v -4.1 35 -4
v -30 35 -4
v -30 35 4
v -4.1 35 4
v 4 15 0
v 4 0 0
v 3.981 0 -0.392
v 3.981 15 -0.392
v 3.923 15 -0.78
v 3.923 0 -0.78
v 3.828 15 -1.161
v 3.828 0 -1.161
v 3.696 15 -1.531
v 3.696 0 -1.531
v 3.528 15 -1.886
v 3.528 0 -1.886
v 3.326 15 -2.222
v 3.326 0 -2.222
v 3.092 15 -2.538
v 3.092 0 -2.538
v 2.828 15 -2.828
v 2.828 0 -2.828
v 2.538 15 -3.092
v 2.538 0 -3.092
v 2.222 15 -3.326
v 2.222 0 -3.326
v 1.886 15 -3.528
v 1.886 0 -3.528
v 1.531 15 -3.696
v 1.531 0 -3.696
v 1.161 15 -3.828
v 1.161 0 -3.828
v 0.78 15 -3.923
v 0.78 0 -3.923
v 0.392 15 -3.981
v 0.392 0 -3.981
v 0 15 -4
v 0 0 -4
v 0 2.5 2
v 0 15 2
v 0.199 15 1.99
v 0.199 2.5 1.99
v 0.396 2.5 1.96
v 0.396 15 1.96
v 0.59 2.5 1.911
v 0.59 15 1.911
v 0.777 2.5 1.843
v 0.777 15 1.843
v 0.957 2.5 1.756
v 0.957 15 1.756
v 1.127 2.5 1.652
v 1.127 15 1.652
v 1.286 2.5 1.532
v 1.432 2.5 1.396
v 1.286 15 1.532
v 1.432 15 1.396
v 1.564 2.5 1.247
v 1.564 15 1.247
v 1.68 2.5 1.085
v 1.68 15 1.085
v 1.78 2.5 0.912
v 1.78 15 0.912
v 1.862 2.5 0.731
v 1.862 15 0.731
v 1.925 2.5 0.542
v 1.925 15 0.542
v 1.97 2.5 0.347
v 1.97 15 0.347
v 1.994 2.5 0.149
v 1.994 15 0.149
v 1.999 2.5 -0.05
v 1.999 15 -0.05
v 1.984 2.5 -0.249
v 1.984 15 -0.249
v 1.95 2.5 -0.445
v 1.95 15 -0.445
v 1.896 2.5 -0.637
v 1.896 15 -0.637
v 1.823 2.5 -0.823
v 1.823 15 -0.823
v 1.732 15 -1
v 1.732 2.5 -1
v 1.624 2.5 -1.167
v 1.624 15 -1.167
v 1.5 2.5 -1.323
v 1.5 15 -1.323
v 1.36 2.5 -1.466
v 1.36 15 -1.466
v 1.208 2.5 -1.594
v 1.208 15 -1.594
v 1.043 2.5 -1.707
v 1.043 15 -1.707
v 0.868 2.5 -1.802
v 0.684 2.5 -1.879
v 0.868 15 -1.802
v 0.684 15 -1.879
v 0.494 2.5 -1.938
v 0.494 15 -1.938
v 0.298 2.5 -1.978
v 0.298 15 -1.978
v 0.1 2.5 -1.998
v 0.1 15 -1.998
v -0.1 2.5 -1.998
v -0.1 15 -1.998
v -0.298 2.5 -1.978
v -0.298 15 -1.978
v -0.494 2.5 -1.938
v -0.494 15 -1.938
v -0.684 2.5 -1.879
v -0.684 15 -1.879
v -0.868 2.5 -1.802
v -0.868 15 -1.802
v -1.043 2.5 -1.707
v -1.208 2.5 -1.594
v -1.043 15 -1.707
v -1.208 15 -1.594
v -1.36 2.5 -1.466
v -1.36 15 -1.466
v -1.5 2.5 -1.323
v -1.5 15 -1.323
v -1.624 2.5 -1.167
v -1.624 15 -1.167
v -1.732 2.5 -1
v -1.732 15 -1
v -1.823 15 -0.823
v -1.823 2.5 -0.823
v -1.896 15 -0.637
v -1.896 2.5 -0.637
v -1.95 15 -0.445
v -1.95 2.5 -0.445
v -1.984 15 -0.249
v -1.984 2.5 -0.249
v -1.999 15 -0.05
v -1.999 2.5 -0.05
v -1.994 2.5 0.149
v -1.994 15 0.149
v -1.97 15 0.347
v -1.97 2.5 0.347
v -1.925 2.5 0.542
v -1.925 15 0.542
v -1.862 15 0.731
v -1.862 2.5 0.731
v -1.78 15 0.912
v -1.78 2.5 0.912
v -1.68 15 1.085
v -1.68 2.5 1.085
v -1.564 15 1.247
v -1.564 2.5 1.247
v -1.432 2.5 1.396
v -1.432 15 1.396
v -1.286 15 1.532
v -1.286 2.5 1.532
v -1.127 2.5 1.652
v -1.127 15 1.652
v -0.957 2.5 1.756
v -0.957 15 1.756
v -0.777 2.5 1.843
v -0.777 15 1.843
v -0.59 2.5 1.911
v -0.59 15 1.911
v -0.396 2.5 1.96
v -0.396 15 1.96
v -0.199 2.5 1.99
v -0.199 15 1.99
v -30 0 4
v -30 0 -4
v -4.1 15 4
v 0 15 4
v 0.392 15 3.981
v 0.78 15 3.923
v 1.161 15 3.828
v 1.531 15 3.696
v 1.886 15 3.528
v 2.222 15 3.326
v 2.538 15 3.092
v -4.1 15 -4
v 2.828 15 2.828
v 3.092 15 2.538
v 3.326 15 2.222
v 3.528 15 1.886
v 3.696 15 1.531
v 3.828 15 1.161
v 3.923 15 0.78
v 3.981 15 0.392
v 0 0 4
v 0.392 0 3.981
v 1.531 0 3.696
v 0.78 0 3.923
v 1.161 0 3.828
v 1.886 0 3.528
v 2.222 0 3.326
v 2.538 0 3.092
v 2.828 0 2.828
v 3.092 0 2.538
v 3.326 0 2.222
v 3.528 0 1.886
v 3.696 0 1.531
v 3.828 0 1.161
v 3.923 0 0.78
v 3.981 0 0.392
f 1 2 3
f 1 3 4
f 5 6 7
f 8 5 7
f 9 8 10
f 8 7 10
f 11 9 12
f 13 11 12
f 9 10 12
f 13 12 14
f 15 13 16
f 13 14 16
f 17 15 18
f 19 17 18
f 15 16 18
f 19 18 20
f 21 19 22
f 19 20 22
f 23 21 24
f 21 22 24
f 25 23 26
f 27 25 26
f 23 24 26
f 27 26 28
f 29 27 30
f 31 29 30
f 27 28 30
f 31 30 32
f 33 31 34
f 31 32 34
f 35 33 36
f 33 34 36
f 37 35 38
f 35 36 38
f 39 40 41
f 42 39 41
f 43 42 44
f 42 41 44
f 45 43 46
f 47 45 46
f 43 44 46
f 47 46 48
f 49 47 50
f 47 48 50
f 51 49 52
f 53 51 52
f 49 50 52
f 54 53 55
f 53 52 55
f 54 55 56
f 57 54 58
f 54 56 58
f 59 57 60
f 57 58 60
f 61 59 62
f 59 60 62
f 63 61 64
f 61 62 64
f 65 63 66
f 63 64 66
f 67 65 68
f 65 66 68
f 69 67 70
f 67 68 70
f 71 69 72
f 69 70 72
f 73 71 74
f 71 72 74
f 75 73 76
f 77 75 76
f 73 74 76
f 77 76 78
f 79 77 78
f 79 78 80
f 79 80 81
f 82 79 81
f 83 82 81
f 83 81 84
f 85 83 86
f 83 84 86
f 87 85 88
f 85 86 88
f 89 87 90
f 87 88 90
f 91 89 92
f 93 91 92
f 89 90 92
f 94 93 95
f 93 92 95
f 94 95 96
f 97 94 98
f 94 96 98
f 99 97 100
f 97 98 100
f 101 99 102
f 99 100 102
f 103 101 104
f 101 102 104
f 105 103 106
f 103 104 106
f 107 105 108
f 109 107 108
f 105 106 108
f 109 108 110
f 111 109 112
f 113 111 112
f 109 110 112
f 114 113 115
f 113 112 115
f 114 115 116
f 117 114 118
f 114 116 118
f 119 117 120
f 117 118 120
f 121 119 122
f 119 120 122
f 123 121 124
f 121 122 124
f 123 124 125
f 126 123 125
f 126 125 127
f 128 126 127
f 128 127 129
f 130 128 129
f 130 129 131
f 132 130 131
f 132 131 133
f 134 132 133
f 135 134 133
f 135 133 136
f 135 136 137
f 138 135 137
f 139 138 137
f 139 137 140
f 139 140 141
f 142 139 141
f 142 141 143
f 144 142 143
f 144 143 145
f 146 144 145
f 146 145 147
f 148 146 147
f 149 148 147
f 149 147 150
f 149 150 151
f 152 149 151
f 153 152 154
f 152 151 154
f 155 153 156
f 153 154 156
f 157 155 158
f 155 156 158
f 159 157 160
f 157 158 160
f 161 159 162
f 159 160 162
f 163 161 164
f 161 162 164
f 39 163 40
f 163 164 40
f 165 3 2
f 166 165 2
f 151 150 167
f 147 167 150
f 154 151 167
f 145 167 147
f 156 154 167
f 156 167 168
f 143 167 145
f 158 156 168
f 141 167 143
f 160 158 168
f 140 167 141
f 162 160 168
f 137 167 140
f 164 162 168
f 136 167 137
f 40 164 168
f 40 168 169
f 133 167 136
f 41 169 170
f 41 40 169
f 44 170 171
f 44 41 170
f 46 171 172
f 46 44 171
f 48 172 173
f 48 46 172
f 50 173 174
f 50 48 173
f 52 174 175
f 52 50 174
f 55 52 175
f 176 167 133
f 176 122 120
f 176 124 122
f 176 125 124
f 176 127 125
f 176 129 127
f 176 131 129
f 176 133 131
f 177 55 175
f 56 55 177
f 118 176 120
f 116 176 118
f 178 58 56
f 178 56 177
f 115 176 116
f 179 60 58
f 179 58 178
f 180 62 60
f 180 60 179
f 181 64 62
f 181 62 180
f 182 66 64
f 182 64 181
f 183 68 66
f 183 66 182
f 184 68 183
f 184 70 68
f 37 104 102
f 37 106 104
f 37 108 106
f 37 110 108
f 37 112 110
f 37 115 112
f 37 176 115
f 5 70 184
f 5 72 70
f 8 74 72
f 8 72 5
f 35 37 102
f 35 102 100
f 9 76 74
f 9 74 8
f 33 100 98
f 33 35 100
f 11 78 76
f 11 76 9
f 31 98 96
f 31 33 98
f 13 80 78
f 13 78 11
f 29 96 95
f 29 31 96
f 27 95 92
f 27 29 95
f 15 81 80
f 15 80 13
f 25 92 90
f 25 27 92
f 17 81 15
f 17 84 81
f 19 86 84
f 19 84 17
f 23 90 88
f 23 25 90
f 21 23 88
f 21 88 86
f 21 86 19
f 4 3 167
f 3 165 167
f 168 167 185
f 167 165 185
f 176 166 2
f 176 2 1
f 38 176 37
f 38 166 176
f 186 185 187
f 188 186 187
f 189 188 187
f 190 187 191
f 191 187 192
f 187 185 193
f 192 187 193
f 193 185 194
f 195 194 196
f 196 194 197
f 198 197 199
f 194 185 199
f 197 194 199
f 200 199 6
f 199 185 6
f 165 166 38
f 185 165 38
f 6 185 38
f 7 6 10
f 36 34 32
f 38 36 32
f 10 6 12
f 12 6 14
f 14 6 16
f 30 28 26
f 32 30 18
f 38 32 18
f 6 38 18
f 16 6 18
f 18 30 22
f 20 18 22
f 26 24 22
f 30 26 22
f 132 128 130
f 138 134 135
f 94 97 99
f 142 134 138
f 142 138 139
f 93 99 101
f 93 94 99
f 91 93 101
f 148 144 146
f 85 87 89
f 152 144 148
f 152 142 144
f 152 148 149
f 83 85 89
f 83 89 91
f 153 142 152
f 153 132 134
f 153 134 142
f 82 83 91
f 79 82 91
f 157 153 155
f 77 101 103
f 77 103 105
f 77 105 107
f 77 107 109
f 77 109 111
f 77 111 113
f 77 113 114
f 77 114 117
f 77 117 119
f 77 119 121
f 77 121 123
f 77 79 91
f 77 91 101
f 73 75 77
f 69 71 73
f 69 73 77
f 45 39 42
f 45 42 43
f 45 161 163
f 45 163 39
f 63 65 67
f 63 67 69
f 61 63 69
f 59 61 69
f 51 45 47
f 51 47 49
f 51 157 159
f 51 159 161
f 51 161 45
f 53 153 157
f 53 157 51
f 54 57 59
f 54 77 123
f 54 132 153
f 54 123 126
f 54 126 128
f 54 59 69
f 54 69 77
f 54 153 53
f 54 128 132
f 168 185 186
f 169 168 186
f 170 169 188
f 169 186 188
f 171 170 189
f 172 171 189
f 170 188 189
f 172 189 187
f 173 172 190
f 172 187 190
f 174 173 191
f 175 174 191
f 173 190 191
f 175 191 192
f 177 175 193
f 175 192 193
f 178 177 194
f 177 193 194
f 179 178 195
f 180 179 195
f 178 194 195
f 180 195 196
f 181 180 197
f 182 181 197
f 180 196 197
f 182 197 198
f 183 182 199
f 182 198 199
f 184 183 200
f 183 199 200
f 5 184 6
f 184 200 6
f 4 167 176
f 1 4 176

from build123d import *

# Parameters (mm, degrees)
BOSS_EXTRUDE1_DEPTH = 15
SKETCH3_R           = 2
CUT_EXTRUDE1_DEPTH  = 12.5
SKETCH4_W           = 25.9
SKETCH4_H           = 8
BOSS_EXTRUDE2_DEPTH = 20


with BuildPart() as part:
    # Sketch2 → Boss-Extrude1 (new body)
    with BuildSketch(Plane(origin=(0, 0, 0), x_dir=(1, 0, 0), z_dir=(0, 1, 0))):
        with BuildLine():
            Line((-30, -4), (0, -4))
            ThreePointArc((0, -4), (-4, 0), (0, 4))
            Line((0, 4), (-30, 4))
            Line((-30, 4), (-30, -4))
        make_face()
        with BuildLine():
            ThreePointArc((0, 4), (-4, 0), (0, -4))
            Line((0, -4), (0, 4))
        make_face()
        with BuildLine():
            Line((0, 4), (0, -4))
            ThreePointArc((0, -4), (2.828427125, -2.828427125), (4, 0))
            ThreePointArc((4, 0), (2.828427125, 2.828427125), (0, 4))
        make_face()
    extrude(amount=BOSS_EXTRUDE1_DEPTH)

    # Sketch3 → Cut-Extrude1 (cut)
    with BuildSketch(Plane(origin=(0, 15, 0), x_dir=(1, 0, 0), z_dir=(0, 1, 0))):
        with Locations(Location((0, 0, 0), (0, 0, 270))):
            Circle(SKETCH3_R)
    extrude(amount=-CUT_EXTRUDE1_DEPTH, mode=Mode.SUBTRACT)

    # Sketch4 → Boss-Extrude2 (add)
    with BuildSketch(Plane(origin=(0, 15, 0), x_dir=(1, 0, 0), z_dir=(0, 1, 0))):
        with Locations((-17.05, 0)):
            Rectangle(SKETCH4_W, SKETCH4_H)
    extrude(amount=BOSS_EXTRUDE2_DEPTH)


solid = part.part
